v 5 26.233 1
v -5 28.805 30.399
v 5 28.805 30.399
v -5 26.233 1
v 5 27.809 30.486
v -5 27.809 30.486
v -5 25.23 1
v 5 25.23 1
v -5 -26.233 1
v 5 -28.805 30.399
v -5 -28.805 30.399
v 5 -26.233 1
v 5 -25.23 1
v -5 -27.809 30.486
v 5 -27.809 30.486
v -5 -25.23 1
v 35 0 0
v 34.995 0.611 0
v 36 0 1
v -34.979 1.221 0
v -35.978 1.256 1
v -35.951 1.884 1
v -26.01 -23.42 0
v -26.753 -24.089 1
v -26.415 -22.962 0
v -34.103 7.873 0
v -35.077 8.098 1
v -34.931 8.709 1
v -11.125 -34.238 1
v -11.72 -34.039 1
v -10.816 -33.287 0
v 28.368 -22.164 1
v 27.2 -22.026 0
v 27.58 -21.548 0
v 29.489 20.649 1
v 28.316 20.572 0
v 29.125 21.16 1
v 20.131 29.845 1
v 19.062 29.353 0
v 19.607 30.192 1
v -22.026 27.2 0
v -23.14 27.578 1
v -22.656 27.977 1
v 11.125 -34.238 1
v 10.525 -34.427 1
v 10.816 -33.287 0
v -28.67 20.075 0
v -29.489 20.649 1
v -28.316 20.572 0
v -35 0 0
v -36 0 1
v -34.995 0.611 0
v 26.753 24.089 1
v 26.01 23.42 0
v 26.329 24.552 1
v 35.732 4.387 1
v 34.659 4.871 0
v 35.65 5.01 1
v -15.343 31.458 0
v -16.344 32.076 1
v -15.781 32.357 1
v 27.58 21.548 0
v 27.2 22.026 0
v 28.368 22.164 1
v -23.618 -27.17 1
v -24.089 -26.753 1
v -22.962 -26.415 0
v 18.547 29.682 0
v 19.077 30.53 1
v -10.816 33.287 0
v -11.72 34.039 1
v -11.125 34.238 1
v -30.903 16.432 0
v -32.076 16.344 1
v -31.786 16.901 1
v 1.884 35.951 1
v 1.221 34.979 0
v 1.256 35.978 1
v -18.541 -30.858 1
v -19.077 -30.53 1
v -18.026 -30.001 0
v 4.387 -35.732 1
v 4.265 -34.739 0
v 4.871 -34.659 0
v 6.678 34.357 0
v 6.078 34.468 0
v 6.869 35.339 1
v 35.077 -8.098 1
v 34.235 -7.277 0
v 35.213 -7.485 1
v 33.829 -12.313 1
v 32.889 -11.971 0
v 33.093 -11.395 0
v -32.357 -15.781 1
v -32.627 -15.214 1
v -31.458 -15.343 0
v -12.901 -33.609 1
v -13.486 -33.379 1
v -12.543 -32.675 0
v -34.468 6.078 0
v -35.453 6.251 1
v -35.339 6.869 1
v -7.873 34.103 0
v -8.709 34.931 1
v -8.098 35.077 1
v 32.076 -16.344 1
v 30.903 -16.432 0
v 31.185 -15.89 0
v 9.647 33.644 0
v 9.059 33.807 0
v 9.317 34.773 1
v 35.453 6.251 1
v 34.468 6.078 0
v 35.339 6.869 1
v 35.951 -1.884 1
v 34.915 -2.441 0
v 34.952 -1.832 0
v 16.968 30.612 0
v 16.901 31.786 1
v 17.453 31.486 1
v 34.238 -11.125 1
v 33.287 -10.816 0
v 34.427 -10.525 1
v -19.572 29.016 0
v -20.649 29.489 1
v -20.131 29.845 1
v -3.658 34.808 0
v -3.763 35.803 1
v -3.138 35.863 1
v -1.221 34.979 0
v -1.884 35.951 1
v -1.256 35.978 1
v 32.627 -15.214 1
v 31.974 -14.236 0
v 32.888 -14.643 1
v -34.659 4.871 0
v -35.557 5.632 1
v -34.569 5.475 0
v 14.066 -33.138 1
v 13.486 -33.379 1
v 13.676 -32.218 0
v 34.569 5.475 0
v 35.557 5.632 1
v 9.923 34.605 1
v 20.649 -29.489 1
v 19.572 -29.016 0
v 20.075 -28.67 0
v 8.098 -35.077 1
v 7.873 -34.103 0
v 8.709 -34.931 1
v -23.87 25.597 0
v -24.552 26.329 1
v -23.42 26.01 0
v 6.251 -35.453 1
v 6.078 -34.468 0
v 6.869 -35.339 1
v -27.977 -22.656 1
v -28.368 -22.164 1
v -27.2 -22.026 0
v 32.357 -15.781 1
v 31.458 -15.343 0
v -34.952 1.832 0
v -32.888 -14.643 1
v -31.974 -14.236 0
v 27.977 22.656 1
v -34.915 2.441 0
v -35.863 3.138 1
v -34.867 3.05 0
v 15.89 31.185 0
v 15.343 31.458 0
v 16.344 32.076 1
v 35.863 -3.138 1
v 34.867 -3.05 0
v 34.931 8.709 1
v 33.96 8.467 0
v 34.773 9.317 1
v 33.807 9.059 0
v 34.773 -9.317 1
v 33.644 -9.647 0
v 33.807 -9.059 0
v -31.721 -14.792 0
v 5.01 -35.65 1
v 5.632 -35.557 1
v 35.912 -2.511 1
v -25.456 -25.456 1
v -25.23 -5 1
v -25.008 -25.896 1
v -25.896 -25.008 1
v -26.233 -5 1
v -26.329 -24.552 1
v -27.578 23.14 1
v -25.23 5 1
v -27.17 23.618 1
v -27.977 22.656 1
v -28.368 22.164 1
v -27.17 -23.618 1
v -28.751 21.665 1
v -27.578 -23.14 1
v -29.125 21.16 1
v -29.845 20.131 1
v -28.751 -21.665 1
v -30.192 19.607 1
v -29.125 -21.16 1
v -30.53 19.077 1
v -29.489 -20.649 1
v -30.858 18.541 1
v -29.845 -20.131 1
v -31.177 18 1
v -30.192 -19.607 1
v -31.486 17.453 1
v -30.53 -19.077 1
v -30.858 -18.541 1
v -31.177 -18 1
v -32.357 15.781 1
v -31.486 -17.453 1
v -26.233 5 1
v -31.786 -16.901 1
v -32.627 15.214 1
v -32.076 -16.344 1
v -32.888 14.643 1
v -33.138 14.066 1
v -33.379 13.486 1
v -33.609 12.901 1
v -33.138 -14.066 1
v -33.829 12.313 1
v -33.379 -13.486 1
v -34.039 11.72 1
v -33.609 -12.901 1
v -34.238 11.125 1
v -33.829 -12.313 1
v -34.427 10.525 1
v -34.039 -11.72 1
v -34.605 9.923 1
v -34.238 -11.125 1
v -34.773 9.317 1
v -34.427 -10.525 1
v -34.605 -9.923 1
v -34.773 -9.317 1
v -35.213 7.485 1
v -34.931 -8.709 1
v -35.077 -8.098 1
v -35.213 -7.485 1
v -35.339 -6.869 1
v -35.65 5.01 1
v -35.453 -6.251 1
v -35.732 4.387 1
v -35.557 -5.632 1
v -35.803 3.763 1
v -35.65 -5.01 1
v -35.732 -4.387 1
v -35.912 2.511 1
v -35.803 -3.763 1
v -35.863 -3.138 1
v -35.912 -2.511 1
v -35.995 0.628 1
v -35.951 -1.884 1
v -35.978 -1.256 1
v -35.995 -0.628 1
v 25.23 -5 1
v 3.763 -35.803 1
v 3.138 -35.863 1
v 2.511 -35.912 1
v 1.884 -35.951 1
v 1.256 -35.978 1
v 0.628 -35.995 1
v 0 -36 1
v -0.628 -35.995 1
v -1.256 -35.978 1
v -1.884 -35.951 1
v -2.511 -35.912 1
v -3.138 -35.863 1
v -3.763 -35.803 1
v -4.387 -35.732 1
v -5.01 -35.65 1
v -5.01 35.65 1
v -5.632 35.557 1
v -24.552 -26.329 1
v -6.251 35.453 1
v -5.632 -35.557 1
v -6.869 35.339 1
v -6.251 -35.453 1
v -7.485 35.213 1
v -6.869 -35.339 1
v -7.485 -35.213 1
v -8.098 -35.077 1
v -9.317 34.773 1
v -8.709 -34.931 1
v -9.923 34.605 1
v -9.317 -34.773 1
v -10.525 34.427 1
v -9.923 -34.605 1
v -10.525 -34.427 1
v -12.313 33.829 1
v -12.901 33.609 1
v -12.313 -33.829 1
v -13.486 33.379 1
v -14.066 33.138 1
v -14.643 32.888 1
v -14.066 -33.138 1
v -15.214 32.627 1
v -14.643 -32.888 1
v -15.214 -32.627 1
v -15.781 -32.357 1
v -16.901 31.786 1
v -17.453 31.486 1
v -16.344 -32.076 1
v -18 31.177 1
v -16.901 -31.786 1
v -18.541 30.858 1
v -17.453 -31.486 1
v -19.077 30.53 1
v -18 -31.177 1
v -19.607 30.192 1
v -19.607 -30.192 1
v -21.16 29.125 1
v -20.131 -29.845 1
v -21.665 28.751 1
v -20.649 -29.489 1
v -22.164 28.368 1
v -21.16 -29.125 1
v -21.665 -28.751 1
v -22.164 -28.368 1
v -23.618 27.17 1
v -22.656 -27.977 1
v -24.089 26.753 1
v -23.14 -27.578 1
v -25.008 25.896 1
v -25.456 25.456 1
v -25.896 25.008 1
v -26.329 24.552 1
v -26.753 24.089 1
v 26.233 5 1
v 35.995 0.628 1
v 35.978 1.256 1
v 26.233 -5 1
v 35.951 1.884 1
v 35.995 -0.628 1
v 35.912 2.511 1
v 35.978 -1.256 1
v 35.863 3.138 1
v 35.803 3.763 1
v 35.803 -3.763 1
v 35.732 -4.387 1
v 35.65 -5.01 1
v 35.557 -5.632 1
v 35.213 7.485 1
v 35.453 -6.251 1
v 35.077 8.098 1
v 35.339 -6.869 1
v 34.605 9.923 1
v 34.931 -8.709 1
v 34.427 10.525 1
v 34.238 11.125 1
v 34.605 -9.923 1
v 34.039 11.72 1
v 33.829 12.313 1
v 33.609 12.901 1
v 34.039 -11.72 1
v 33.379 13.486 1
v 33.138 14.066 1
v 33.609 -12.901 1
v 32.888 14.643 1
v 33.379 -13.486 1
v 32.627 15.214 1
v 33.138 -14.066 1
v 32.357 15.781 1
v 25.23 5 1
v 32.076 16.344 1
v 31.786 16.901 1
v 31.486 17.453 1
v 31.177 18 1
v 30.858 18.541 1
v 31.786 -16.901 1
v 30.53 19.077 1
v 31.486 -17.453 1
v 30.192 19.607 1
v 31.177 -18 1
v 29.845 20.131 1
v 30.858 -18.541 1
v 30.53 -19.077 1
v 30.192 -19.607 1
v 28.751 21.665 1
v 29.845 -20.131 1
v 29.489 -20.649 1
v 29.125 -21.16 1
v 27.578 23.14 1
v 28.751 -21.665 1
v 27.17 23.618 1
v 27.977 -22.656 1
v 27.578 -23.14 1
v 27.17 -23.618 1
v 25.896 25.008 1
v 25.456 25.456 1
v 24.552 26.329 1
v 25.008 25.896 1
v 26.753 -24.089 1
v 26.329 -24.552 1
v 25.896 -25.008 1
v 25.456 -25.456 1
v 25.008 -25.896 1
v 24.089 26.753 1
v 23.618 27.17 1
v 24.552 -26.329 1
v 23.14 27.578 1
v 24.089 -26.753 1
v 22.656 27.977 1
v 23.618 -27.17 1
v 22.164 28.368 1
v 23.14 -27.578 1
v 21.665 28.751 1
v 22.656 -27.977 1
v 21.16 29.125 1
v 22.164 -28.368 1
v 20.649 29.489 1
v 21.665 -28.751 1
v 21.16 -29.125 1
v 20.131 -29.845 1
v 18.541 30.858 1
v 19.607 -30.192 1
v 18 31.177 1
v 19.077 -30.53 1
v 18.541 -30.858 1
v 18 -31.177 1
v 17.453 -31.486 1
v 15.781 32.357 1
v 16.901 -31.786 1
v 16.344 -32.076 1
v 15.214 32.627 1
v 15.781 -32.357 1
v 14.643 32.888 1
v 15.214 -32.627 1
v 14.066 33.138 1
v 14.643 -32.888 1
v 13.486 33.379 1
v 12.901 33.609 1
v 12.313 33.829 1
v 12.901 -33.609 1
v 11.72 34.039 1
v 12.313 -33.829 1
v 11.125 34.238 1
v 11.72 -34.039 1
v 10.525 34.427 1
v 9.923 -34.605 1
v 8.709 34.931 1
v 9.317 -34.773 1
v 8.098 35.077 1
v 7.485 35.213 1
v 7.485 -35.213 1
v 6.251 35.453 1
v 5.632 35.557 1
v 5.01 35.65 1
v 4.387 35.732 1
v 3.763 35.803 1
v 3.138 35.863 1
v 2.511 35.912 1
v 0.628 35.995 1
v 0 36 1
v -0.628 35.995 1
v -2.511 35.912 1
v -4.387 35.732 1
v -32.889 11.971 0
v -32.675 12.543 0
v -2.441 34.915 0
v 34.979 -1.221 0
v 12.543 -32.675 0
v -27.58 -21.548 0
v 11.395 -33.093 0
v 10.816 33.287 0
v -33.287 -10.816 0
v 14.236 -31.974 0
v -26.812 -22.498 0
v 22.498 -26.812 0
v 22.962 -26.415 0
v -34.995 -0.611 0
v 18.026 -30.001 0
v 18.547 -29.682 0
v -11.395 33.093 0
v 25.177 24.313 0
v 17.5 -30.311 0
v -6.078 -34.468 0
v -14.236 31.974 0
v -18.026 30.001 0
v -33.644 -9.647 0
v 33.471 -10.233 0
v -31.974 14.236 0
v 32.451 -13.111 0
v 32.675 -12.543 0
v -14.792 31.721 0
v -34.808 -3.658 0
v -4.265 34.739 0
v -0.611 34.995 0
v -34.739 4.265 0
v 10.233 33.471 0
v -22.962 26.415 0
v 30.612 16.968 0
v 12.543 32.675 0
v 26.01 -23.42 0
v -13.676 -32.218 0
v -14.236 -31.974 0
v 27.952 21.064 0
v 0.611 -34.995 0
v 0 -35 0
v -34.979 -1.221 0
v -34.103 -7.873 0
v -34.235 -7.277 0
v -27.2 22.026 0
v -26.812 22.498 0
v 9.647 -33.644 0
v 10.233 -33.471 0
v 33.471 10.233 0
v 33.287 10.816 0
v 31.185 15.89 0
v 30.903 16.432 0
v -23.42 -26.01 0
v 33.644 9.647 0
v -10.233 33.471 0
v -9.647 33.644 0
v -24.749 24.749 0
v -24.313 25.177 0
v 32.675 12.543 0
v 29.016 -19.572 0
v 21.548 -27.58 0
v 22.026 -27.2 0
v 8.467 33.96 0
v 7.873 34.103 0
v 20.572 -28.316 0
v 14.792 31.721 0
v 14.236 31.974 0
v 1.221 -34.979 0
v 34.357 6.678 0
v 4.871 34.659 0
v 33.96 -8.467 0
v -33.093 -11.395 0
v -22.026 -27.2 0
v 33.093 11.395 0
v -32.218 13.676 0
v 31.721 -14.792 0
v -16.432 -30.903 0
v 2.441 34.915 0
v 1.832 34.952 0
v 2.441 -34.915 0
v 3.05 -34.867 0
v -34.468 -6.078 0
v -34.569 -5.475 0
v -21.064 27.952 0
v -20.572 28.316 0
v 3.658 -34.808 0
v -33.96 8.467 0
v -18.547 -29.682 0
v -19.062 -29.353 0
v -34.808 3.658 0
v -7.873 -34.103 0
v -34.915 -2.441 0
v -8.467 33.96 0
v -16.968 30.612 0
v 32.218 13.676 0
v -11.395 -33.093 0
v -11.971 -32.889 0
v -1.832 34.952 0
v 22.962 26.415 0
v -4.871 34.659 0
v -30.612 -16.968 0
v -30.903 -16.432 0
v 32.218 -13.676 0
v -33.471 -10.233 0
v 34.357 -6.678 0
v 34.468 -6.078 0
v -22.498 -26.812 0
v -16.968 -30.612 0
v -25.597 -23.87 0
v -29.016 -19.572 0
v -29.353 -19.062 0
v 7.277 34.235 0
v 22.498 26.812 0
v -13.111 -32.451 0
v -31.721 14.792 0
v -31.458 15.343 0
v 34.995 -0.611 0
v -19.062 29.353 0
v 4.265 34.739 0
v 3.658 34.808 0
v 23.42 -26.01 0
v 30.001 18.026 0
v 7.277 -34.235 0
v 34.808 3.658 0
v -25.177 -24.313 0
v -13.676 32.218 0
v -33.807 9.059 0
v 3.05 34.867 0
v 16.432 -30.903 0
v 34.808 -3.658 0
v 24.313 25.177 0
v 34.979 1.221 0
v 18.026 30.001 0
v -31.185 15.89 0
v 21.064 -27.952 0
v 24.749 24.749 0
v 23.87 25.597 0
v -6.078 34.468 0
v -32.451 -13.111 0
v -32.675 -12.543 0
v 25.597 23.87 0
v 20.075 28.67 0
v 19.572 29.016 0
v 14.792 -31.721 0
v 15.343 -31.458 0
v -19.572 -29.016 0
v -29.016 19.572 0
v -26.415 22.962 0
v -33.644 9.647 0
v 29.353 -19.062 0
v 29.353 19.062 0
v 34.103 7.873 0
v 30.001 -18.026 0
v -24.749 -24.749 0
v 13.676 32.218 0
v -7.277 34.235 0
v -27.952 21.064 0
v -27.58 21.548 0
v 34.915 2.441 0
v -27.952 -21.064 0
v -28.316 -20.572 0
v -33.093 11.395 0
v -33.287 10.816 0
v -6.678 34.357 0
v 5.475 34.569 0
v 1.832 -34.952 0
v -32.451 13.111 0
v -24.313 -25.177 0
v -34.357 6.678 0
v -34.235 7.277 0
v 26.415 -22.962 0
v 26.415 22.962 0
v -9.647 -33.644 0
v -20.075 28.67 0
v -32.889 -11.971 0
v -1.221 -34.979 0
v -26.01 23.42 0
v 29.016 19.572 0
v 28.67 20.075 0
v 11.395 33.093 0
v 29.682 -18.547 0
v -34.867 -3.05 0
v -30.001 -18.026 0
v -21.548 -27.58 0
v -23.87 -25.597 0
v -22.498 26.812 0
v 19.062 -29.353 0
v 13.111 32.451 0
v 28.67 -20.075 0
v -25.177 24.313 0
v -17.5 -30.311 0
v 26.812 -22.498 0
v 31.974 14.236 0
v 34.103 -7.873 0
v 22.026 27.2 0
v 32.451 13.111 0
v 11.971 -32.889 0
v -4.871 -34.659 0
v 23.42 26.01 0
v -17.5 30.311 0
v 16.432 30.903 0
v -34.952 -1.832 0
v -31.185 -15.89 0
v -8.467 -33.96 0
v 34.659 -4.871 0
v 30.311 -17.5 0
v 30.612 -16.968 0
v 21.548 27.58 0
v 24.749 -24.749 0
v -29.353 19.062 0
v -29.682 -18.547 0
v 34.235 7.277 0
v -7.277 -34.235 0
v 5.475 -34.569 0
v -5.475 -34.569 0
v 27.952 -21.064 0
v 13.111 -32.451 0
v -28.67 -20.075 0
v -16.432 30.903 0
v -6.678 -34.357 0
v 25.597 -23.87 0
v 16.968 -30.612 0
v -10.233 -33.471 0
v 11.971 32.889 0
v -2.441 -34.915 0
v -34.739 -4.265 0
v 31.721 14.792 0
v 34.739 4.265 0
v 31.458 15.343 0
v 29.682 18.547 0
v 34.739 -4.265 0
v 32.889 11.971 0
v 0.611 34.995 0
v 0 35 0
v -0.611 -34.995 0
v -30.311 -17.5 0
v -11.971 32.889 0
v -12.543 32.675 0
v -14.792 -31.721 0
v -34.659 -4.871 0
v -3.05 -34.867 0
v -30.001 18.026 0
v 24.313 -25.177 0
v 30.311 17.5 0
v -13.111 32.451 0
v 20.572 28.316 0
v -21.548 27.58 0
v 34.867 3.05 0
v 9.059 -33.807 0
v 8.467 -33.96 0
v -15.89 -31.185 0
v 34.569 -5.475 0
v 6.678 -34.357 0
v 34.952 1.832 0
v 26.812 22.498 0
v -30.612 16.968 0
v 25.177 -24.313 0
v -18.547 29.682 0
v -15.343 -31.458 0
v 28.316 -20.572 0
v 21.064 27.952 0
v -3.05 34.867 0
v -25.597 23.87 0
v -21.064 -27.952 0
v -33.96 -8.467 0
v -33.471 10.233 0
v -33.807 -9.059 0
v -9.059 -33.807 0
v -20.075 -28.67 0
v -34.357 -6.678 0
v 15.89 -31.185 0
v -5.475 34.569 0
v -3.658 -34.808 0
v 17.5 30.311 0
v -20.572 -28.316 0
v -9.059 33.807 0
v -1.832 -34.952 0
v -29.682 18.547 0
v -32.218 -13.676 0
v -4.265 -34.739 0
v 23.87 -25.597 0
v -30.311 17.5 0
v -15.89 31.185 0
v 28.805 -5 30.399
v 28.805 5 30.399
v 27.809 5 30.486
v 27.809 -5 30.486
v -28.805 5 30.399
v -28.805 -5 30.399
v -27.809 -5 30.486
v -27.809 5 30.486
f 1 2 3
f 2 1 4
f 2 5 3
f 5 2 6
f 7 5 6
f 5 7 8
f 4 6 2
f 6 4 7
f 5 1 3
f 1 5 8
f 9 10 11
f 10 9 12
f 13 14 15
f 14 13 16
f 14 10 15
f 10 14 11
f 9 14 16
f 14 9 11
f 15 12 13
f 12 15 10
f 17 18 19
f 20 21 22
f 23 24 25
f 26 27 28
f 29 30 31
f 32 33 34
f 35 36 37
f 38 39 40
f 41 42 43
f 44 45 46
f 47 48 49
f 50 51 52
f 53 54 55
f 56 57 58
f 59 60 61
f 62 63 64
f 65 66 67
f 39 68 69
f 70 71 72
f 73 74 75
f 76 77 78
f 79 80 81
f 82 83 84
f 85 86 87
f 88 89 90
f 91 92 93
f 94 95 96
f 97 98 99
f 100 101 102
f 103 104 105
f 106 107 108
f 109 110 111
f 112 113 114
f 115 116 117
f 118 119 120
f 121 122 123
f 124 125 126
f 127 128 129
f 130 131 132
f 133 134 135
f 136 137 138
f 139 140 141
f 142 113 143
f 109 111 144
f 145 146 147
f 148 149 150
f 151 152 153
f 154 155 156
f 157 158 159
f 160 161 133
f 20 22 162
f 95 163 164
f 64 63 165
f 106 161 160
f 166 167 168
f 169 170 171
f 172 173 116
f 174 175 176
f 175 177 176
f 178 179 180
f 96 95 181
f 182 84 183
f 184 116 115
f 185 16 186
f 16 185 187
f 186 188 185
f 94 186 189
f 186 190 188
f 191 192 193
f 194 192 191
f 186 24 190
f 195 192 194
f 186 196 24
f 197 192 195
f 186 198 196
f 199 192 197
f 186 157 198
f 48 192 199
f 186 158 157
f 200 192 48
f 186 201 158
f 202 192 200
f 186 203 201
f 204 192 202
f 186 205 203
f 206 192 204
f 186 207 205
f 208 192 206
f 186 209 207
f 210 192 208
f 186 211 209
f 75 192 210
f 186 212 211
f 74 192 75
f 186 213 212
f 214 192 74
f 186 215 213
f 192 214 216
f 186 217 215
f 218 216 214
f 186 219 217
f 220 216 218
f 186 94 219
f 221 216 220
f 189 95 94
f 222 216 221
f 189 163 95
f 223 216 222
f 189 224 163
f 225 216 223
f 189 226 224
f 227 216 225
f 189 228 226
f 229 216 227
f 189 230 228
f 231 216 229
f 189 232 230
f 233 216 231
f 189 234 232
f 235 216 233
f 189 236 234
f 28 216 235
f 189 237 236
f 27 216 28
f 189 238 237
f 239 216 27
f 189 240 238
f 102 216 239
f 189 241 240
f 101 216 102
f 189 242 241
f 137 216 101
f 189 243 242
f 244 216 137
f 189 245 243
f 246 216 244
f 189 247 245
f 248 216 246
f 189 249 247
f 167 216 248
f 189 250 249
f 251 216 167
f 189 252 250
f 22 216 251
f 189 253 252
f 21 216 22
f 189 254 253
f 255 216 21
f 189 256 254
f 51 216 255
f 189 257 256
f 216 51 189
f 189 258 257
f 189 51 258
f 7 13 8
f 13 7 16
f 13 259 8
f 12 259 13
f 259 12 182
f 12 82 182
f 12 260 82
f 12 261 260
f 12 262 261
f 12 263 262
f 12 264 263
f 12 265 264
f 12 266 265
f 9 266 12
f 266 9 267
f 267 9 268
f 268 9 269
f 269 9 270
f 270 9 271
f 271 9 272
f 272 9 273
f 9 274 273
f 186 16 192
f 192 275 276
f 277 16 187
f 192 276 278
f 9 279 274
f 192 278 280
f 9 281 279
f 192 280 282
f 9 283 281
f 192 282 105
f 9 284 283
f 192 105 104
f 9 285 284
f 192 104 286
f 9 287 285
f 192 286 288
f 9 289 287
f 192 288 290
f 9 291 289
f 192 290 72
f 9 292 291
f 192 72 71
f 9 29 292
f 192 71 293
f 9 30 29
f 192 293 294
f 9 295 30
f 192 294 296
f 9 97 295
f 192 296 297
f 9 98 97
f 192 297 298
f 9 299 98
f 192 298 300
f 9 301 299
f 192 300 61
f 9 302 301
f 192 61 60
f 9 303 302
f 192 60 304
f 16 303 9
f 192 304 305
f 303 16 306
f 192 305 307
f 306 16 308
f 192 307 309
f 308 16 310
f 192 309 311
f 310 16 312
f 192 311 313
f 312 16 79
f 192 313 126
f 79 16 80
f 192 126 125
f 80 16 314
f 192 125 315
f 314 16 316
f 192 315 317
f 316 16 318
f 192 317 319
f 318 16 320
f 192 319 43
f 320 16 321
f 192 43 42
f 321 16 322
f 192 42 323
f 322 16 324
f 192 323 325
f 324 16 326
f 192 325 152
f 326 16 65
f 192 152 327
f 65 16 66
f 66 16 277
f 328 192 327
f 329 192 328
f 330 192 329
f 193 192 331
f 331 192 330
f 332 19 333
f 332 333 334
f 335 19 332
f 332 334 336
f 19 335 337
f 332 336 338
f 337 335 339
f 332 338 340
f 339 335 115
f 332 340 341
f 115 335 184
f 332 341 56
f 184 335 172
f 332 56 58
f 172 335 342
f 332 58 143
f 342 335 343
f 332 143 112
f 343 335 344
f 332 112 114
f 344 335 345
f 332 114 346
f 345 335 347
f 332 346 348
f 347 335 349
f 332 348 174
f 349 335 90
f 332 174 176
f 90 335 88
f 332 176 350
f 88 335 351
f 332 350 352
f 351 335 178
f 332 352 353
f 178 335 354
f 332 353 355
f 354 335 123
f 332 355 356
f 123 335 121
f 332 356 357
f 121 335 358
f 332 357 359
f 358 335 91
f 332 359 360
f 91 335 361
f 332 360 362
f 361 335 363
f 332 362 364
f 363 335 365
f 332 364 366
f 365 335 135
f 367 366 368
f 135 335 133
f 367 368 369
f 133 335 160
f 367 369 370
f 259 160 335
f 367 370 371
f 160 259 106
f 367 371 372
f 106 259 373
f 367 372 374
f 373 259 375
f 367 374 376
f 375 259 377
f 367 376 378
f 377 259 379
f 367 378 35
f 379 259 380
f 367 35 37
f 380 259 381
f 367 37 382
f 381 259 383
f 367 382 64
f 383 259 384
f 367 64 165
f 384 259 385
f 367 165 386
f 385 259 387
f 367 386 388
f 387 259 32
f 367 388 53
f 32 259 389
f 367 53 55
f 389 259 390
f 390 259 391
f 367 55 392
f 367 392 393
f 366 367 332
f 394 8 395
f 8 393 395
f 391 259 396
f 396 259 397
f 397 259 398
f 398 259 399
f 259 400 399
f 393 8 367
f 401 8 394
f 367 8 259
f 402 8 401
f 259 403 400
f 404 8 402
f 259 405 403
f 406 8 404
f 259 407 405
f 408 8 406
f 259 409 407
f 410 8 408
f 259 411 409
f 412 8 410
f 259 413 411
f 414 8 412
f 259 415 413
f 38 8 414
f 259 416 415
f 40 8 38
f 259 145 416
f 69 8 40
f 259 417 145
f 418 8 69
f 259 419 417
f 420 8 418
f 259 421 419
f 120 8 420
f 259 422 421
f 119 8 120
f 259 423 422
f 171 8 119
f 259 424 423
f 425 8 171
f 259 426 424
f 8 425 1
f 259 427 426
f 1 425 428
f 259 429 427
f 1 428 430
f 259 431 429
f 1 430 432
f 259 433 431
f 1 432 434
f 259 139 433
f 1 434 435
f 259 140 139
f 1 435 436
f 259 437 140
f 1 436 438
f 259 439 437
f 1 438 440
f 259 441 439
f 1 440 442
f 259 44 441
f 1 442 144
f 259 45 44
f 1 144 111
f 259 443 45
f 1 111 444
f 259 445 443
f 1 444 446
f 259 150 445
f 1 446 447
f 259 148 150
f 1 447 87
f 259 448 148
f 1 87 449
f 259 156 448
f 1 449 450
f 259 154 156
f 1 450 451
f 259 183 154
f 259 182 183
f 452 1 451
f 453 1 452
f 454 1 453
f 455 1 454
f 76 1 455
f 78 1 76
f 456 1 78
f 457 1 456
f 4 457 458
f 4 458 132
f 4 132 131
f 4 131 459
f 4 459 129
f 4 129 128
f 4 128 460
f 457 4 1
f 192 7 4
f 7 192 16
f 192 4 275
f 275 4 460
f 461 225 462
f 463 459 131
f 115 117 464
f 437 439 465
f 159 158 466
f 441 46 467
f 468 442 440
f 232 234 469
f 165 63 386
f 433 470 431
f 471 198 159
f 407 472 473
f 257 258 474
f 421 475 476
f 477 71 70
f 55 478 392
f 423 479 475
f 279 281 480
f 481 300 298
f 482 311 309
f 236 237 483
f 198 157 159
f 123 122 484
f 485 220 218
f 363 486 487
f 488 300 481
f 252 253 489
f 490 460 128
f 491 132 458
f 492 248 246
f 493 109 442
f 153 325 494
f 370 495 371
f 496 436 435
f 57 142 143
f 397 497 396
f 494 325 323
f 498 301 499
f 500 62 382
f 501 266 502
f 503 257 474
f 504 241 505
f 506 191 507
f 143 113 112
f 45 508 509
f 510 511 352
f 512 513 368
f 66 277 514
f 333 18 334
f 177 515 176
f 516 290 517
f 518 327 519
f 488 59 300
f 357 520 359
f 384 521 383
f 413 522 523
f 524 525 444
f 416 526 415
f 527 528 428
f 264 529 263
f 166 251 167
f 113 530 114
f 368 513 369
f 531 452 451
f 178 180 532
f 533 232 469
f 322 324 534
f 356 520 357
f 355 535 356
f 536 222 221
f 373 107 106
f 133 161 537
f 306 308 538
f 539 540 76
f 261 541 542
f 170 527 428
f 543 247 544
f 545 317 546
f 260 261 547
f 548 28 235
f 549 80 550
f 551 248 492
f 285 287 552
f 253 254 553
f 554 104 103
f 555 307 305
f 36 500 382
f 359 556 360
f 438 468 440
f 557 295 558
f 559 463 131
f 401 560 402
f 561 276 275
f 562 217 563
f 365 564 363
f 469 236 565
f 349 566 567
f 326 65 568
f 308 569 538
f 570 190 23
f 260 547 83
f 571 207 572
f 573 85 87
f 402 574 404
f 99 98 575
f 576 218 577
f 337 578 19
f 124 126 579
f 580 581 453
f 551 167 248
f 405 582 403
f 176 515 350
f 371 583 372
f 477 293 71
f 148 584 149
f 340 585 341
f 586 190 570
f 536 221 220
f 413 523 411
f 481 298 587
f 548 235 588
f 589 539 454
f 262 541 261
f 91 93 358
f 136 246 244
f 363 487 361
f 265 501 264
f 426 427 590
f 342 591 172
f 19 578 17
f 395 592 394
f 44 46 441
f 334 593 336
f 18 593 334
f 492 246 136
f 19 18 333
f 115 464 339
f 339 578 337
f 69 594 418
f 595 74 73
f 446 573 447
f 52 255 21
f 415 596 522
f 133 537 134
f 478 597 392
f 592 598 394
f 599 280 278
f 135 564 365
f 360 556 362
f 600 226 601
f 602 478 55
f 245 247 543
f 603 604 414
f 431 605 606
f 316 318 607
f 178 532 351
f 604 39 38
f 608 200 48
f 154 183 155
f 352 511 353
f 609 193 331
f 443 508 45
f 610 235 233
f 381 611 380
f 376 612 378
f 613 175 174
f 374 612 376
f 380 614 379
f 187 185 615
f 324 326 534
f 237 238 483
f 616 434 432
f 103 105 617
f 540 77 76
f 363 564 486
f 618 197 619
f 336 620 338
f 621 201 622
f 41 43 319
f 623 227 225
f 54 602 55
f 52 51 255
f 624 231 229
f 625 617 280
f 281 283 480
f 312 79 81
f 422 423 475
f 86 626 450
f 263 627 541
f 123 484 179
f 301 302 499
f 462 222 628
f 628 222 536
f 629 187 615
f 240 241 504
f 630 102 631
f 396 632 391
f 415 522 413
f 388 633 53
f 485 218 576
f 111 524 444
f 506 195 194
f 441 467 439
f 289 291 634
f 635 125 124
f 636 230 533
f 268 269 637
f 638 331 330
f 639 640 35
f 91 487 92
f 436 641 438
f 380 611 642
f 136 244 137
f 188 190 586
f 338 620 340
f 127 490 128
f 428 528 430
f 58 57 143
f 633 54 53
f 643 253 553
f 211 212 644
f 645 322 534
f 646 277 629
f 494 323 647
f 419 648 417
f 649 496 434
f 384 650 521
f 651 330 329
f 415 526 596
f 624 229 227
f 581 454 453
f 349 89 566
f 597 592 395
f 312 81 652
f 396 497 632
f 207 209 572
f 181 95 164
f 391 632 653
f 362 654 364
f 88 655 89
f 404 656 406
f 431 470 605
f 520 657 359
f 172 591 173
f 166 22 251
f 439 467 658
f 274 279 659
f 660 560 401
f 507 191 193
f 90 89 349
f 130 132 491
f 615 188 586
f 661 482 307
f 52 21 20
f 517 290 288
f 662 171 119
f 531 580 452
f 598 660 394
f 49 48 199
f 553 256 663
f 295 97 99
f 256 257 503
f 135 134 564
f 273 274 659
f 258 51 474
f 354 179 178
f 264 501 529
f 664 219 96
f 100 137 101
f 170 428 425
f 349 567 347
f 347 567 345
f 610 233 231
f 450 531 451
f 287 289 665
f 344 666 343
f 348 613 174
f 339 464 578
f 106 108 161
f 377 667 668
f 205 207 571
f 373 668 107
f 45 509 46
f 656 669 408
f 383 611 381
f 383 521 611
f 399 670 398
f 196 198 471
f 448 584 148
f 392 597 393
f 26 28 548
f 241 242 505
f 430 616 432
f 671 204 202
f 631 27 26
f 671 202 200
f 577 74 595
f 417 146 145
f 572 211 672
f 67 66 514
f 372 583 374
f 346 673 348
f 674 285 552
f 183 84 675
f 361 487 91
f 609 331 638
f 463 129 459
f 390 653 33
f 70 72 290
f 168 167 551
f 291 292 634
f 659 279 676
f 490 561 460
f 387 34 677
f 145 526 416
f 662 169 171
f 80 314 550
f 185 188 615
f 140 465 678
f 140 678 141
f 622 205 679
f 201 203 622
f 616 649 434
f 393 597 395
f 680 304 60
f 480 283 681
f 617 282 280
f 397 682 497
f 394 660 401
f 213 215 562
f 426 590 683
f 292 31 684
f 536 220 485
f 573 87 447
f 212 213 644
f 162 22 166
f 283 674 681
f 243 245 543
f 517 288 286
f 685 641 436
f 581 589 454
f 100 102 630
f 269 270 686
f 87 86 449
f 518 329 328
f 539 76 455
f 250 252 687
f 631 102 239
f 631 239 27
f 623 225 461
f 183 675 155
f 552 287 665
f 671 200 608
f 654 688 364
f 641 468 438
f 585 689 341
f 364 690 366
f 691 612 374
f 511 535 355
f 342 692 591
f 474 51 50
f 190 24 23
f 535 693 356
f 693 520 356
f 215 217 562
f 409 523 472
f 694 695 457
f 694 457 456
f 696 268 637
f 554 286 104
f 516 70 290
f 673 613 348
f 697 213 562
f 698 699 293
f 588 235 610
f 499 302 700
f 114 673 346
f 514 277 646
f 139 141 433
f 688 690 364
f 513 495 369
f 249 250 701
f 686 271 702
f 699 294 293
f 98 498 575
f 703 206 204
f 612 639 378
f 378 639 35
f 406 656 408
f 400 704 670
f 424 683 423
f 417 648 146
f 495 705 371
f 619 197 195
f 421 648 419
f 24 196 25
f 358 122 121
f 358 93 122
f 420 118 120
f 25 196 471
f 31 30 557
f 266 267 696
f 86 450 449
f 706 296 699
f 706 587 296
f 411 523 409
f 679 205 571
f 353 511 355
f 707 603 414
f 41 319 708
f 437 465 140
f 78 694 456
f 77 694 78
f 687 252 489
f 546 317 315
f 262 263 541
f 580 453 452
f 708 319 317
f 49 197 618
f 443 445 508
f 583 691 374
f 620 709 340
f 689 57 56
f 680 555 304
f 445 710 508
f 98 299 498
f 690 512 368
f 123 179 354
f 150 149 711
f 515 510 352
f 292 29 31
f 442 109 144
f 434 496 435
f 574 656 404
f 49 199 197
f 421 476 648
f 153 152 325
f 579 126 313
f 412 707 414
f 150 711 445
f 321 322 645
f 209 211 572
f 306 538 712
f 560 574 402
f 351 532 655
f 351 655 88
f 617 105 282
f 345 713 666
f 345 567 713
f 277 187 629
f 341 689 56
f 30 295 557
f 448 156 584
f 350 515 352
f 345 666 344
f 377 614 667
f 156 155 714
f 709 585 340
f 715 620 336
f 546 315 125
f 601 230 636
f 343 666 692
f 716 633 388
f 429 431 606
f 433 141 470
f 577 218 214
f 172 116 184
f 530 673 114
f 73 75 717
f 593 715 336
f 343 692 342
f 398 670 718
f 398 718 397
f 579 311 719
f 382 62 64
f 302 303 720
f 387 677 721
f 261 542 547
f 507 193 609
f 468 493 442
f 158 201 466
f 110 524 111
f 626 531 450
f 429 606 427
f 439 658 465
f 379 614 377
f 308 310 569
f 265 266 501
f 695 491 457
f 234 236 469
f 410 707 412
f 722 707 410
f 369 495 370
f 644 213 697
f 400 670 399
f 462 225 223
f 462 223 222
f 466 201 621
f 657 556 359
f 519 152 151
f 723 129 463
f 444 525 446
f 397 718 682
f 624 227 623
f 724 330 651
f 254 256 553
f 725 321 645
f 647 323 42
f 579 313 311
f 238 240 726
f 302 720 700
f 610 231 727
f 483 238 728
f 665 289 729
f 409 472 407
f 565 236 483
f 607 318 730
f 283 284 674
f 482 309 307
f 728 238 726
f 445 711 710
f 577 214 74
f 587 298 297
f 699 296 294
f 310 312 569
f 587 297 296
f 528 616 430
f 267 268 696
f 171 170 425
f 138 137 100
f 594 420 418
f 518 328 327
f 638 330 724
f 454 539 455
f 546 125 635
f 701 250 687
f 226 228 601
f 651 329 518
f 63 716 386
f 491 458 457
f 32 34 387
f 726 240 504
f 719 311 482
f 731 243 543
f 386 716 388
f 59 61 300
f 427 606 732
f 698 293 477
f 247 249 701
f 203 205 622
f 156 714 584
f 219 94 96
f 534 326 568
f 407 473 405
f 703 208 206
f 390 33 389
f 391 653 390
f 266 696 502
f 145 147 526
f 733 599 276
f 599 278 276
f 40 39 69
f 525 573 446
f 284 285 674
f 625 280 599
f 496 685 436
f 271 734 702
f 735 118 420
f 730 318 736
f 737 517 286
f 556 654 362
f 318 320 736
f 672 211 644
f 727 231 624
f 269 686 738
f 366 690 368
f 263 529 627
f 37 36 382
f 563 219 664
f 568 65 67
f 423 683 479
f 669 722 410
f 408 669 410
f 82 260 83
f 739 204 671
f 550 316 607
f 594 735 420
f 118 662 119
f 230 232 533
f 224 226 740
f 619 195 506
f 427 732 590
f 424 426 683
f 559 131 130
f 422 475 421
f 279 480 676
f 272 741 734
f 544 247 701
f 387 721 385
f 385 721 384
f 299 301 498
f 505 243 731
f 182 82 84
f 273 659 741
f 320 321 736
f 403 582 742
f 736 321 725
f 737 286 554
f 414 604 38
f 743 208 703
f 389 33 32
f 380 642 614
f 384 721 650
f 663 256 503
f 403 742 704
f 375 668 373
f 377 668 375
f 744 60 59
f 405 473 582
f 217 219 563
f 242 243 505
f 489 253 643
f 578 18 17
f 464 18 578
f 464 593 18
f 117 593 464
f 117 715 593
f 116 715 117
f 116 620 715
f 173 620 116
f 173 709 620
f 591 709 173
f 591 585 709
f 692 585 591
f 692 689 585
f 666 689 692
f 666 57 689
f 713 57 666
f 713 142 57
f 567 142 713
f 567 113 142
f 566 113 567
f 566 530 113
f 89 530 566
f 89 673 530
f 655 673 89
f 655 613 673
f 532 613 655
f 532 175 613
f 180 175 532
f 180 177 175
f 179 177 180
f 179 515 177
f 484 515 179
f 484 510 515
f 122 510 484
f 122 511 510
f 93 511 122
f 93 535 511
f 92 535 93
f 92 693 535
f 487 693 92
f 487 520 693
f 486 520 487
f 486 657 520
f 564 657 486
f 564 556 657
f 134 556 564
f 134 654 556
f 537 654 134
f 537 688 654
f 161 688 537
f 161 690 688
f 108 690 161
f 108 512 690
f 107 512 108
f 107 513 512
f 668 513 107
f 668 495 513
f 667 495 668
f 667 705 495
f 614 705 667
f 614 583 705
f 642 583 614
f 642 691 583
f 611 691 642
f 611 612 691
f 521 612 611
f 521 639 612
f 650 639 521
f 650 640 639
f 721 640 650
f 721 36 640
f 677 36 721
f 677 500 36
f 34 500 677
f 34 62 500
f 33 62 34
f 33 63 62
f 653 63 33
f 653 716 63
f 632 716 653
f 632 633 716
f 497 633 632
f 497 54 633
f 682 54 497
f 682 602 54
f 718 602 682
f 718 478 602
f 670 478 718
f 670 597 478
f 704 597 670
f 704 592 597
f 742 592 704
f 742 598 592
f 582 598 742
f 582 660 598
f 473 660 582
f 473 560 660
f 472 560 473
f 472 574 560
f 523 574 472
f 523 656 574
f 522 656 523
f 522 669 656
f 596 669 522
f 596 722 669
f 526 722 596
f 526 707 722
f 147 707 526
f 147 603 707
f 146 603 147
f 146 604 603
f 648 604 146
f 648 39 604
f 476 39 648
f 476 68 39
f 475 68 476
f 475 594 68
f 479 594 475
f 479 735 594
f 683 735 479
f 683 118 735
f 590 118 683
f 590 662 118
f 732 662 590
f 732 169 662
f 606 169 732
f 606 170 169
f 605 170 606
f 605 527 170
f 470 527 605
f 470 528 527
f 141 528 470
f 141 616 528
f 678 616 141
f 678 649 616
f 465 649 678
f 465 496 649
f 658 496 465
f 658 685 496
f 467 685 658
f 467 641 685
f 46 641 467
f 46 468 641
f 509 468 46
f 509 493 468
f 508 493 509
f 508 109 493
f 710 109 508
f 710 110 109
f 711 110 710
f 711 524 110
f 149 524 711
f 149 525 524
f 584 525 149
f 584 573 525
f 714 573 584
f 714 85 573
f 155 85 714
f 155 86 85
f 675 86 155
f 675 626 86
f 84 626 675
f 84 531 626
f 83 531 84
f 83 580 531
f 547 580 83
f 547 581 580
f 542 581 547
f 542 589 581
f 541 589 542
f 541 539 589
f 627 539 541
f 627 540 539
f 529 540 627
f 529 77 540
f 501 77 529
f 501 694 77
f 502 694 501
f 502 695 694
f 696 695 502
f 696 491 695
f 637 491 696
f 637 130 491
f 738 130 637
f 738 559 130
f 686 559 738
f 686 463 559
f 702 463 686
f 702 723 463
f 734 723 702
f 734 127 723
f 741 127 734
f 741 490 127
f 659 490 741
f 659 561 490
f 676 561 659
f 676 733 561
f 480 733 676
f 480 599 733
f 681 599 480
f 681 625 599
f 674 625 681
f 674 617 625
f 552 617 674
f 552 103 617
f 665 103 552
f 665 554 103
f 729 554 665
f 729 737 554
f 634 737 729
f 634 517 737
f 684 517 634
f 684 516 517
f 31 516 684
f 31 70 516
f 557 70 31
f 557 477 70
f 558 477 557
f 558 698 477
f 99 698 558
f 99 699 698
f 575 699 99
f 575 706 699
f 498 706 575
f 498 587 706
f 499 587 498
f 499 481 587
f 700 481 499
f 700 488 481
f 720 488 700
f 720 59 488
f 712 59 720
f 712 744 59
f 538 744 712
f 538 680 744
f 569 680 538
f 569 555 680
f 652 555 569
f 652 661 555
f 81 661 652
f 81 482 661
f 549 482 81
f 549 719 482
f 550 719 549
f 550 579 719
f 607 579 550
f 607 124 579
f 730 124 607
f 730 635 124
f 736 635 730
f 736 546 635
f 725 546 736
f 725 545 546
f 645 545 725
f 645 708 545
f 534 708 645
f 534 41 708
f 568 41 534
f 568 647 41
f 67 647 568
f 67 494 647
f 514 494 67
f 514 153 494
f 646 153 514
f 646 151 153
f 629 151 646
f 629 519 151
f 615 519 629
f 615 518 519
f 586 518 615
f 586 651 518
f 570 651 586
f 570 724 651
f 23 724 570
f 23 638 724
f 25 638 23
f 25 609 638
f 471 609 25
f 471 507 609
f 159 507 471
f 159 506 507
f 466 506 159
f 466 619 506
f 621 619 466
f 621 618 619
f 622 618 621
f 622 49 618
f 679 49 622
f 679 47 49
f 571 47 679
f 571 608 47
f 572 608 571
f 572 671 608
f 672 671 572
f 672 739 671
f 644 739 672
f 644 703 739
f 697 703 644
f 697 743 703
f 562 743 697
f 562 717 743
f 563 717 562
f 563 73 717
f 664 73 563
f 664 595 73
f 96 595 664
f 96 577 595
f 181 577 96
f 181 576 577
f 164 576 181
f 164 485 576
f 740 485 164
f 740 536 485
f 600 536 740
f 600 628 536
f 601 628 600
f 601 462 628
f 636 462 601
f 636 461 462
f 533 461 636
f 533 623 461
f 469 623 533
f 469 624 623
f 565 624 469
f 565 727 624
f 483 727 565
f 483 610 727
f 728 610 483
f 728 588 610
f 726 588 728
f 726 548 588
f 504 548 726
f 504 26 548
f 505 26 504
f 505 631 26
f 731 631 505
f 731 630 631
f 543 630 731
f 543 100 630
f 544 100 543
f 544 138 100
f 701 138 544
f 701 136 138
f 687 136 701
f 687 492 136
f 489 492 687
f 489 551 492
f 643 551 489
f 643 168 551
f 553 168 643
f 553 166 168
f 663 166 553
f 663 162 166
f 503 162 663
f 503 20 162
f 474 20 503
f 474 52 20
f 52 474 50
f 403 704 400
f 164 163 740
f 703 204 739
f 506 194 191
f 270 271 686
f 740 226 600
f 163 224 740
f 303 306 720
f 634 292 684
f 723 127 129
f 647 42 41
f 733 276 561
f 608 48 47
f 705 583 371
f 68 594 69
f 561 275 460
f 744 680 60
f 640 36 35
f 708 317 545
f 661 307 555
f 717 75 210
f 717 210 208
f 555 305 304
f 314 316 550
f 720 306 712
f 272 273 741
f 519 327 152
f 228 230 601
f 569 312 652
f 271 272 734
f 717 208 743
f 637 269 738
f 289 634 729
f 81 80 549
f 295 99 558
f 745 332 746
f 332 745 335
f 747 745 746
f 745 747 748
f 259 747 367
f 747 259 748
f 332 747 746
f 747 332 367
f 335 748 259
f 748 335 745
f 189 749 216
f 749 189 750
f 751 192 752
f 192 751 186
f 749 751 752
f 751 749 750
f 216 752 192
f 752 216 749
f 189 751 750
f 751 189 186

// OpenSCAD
main_d = 72; // main cover diameter
hole_d = 60; // diameter of the hole that needs covering
clamp_depth = 30; // how far the clamps should reach into the whole
clamp_angle = 5; // angle of the clamps (in degrees)

$fn = 360;


cylinder(h=1, d1=main_d-2, d2=main_d);

translate([hole_d/2-3, 0, clamp_depth/2+0.5])
    rotate([0, clamp_angle, 0])
        cube([1, 10, clamp_depth], center=true);

translate([-hole_d/2+3, 0, clamp_depth/2+0.5])
    rotate([0, -clamp_angle, 0])
        cube([1, 10, clamp_depth], center=true);

rotate([0, 0, 90]) {
    translate([hole_d/2-3, 0, clamp_depth/2+0.5])
        rotate([0, clamp_angle, 0])
            cube([1, 10, clamp_depth], center=true);

    translate([-hole_d/2+3, 0, clamp_depth/2+0.5])
        rotate([0, -clamp_angle, 0])
            cube([1, 10, clamp_depth], center=true);
}
